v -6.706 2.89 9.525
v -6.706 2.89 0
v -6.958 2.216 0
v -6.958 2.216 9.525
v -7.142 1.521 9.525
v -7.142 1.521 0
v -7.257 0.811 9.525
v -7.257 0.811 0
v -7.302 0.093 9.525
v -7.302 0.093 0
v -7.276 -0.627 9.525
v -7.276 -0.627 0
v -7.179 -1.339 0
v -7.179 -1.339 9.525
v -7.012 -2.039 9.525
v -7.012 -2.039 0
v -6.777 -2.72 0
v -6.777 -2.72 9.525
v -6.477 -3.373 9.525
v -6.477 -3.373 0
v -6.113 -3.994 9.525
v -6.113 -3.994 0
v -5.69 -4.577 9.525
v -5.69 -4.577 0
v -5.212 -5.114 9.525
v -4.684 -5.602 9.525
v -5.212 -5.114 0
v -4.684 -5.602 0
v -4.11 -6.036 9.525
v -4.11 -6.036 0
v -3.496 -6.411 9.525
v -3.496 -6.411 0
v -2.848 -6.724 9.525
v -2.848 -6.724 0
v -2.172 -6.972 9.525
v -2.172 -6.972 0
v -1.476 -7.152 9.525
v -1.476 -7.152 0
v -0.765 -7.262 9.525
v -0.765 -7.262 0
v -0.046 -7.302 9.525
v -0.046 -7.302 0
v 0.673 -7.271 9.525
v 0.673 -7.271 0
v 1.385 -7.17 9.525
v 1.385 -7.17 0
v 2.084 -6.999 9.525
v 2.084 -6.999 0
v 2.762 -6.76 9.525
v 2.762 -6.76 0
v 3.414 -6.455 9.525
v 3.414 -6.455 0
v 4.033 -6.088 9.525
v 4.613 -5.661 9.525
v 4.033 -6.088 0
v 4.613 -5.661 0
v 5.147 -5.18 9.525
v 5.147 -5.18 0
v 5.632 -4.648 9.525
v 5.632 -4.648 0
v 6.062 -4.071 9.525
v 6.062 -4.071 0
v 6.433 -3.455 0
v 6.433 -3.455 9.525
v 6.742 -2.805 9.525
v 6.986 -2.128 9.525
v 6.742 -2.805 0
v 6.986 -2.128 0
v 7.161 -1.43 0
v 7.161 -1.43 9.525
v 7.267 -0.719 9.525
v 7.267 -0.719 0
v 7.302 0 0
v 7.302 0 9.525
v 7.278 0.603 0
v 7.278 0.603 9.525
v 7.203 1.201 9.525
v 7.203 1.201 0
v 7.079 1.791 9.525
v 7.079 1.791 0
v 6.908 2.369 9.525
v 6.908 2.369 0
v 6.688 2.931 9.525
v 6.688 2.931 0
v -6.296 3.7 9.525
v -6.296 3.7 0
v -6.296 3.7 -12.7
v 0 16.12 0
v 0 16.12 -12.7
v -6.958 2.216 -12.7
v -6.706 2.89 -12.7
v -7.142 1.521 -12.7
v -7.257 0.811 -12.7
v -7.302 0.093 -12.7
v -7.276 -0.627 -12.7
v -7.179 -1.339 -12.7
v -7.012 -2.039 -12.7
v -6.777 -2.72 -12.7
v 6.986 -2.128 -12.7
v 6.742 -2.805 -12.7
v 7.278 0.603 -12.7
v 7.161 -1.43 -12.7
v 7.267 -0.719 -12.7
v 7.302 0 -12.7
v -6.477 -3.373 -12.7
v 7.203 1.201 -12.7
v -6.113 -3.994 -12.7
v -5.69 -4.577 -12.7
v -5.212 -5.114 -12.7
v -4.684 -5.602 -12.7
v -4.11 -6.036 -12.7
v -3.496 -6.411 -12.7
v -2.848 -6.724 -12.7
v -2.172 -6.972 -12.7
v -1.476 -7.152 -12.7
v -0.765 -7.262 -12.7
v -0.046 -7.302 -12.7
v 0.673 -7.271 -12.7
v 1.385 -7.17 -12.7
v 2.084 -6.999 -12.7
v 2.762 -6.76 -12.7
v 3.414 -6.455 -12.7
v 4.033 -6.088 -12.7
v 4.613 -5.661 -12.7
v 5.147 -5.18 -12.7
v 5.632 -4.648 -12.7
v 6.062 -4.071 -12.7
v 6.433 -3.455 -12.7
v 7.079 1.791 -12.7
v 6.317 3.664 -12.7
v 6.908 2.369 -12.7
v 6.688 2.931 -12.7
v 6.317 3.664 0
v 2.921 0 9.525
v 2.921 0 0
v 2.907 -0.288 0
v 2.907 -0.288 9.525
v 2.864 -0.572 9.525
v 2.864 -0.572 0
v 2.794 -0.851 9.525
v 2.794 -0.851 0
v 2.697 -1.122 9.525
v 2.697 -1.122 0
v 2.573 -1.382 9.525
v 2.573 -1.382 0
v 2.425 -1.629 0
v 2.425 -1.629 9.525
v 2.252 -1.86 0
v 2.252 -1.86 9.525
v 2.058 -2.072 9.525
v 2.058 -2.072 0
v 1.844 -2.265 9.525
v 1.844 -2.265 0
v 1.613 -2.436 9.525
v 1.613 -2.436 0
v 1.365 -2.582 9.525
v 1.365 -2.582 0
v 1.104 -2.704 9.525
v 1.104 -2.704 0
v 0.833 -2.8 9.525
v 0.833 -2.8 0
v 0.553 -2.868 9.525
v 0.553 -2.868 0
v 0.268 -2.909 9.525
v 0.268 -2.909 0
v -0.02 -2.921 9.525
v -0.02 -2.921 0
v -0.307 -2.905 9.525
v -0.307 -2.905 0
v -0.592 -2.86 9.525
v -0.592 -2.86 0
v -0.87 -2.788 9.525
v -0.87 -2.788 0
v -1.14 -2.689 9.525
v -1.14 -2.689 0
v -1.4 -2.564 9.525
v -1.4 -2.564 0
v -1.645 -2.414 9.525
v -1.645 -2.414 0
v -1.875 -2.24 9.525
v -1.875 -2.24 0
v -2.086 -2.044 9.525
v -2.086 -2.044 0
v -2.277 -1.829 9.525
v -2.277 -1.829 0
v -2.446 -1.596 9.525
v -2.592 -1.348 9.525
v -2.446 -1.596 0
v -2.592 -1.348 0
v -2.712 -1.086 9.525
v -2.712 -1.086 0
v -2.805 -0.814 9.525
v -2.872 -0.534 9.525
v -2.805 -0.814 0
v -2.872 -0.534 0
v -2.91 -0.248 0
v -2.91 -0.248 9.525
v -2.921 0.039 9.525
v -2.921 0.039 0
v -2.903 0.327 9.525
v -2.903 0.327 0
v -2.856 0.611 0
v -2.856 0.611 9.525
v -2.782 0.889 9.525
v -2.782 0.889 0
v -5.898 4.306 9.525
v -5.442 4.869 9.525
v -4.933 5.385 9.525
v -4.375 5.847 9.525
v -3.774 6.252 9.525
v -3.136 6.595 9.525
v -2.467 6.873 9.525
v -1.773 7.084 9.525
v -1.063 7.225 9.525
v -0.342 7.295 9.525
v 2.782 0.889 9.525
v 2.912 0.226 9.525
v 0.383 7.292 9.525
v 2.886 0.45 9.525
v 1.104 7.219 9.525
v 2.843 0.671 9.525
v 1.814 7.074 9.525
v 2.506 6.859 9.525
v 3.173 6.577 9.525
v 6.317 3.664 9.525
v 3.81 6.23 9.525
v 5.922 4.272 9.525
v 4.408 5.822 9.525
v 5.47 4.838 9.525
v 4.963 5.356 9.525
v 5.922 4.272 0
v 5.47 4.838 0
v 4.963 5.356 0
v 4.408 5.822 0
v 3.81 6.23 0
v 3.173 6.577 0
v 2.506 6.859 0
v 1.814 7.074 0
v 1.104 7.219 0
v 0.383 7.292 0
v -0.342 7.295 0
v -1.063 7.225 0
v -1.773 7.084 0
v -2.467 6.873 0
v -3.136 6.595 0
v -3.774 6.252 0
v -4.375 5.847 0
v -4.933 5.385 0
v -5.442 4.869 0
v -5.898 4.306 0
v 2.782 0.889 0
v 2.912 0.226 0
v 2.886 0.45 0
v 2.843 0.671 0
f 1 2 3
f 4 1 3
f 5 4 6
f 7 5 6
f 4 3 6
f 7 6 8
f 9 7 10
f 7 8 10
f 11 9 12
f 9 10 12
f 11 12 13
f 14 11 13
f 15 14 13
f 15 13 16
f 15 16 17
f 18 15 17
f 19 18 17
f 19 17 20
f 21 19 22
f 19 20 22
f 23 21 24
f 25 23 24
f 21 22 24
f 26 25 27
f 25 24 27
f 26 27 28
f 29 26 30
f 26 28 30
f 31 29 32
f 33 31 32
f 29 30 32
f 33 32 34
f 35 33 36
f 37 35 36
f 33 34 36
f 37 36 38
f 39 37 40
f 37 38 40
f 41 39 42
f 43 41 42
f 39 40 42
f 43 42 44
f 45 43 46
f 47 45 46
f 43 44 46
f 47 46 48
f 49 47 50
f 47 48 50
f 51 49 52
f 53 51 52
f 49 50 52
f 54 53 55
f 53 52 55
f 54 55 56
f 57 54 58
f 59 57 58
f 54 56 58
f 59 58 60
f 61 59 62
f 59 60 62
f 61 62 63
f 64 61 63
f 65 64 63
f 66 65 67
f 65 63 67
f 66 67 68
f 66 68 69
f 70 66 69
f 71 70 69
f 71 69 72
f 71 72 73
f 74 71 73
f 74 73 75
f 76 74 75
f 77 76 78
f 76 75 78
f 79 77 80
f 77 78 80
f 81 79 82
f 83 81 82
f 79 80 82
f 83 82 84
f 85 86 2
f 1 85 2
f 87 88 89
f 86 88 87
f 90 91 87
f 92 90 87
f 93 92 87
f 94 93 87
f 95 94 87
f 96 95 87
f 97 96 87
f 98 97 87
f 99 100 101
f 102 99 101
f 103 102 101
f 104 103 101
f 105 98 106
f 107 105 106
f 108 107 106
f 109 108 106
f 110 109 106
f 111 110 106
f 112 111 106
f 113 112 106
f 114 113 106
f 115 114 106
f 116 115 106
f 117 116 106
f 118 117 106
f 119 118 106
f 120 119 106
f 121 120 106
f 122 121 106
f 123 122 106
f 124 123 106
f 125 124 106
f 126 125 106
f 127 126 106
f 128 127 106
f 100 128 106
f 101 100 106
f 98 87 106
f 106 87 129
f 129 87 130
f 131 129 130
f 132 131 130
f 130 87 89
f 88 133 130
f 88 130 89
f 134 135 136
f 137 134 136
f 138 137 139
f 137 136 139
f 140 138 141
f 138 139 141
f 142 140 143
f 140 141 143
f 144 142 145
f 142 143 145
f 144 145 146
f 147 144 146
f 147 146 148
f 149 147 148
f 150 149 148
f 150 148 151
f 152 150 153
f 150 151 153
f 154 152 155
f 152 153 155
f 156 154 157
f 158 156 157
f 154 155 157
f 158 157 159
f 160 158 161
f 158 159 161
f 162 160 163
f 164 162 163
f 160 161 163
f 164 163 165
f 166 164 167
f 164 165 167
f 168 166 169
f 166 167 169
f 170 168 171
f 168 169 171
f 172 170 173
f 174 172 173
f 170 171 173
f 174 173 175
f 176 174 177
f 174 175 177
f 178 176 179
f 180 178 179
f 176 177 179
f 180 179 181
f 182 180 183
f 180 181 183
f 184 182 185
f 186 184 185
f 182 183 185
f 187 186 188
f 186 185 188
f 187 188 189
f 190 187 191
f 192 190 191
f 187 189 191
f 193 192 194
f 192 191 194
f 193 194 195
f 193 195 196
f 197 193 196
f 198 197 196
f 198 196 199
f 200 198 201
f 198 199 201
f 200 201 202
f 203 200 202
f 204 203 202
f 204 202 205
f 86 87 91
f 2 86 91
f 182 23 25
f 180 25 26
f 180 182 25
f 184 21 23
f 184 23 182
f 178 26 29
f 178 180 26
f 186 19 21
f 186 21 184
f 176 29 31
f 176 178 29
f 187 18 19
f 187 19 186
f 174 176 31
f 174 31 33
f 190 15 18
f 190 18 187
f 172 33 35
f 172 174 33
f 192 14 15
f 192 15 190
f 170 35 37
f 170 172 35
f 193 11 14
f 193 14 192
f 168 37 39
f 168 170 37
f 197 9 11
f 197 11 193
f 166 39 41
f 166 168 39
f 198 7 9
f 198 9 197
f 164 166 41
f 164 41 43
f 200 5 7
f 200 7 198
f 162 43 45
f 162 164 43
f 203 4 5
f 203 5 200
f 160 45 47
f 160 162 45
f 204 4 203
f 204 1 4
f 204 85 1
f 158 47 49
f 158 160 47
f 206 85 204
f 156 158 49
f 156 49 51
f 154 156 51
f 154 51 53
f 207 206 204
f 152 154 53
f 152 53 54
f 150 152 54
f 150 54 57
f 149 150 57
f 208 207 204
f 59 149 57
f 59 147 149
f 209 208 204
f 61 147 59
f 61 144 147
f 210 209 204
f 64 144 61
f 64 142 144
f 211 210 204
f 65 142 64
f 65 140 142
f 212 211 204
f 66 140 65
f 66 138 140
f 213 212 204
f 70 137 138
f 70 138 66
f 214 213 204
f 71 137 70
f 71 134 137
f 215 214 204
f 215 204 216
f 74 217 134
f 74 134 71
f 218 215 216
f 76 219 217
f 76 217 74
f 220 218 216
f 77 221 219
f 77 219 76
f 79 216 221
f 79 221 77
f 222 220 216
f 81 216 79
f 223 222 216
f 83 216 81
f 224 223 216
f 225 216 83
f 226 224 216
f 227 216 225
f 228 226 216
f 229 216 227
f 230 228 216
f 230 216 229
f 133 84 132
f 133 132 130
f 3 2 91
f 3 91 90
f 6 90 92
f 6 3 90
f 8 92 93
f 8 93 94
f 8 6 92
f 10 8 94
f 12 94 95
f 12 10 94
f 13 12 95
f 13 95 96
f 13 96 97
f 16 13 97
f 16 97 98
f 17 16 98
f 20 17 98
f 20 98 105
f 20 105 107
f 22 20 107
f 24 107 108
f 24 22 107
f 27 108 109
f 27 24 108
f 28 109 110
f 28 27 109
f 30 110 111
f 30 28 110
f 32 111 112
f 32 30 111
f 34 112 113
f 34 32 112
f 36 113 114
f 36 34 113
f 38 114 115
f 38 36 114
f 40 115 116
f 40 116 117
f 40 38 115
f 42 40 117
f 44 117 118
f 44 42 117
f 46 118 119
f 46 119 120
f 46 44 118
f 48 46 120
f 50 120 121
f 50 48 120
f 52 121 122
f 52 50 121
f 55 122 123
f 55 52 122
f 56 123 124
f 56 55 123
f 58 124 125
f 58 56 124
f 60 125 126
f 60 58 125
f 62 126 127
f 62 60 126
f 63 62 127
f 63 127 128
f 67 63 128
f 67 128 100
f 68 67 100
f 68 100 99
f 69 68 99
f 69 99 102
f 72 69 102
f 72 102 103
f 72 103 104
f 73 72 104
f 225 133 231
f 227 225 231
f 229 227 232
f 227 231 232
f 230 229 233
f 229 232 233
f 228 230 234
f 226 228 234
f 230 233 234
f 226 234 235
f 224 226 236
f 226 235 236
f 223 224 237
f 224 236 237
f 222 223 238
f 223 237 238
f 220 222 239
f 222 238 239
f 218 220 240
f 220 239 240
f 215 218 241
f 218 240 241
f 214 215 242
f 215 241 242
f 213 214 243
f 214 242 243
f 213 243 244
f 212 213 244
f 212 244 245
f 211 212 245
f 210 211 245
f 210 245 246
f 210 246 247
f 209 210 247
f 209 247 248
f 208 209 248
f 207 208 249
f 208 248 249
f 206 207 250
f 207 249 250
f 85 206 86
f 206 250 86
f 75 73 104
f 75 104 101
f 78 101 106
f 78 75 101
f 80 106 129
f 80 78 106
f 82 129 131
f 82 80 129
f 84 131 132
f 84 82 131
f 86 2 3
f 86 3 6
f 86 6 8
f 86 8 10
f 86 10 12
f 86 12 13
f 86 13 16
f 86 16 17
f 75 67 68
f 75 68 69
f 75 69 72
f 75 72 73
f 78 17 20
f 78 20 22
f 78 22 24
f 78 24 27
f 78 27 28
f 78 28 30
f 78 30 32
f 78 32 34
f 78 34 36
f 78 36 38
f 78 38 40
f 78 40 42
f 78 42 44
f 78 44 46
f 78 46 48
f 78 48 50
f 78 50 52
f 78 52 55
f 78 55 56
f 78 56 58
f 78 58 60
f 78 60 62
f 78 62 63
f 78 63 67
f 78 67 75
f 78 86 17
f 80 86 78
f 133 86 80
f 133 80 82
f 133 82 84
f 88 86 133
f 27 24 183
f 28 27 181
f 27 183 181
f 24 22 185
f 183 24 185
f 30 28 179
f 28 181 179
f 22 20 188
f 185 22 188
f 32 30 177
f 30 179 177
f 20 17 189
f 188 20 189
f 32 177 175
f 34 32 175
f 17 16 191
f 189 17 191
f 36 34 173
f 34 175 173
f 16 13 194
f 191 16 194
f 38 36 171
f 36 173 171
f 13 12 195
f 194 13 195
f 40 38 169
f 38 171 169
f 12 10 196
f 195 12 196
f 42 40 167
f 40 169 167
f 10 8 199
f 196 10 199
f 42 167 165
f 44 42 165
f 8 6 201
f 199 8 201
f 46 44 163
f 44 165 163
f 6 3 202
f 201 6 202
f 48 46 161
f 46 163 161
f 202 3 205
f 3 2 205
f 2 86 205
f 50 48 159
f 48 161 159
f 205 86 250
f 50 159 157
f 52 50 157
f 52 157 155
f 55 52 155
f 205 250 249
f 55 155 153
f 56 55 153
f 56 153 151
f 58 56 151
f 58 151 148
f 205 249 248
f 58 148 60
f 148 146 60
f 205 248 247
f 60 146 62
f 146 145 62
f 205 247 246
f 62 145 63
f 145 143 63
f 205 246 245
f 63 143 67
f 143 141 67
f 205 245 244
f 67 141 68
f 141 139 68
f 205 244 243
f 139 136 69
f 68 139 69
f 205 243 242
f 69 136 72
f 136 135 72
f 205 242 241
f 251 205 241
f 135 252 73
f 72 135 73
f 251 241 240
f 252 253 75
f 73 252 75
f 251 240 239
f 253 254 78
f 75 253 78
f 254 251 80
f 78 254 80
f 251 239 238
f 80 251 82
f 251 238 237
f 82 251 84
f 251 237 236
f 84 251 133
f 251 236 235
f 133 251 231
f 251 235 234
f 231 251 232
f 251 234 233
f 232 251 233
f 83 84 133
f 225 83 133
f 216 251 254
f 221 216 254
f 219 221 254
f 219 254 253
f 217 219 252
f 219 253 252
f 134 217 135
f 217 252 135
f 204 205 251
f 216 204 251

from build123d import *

# Parameters (mm, degrees)
F1_DEPTH = 9.525
F2_DEPTH = 12.7


with BuildPart() as f1:
    # F0 (on Top) → F1 (new body)
    with BuildSketch(Plane.XY):
        with BuildLine():
            ThreePointArc((-6.7061053414, 2.890442423), (-1.4756645952, -7.1518473315), (7.3025, 0))
            ThreePointArc((7.3025, 0), (7.1473488528, 1.4973011139), (6.6884881888, 2.9309779936))
            Line((6.6884881888, 2.9309779936), (6.3166219962, 3.6642588347))
            ThreePointArc((6.3166219962, 3.6642588347), (0.0208084361, 7.3024703532), (-6.2956369305, 3.7001975474))
            Line((-6.2956369305, 3.7001975474), (-6.7061053414, 2.890442423))
        make_face()
        with BuildLine():
            ThreePointArc((2.7824305921, 0.889), (2.8861497501, 0.4498673362), (2.921, 0))
            ThreePointArc((2.921, 0), (-0.4498673362, -2.8861497501), (-2.7824305921, 0.889))
            ThreePointArc((-2.7824305921, 0.889), (0, 2.921), (2.7824305921, 0.889))
        make_face(mode=Mode.SUBTRACT)
        with BuildLine():
            Line((-2.7824305921, 0.889), (2.7824305921, 0.889))
            ThreePointArc((2.7824305921, 0.889), (0, 2.921), (-2.7824305921, 0.889))
        make_face()
    extrude(amount=F1_DEPTH)


with BuildPart() as f2:
    # F0 (on Top) → F2 (new body)
    with BuildSketch(Plane.XY):
        with BuildLine():
            ThreePointArc((-6.7061053414, 2.890442423), (-1.4756645952, -7.1518473315), (7.3025, 0))
            ThreePointArc((7.3025, 0), (7.1473488528, 1.4973011139), (6.6884881888, 2.9309779936))
            Line((6.6884881888, 2.9309779936), (6.3166219962, 3.6642588347))
            ThreePointArc((6.3166219962, 3.6642588347), (0.0208084361, 7.3024703532), (-6.2956369305, 3.7001975474))
            Line((-6.2956369305, 3.7001975474), (-6.7061053414, 2.890442423))
        make_face()
        with BuildLine():
            ThreePointArc((2.7824305921, 0.889), (2.8861497501, 0.4498673362), (2.921, 0))
            ThreePointArc((2.921, 0), (-0.4498673362, -2.8861497501), (-2.7824305921, 0.889))
            ThreePointArc((-2.7824305921, 0.889), (0, 2.921), (2.7824305921, 0.889))
        make_face(mode=Mode.SUBTRACT)
        with BuildLine():
            ThreePointArc((-6.2956369305, 3.7001975474), (0.0208084361, 7.3024703532), (6.3166219962, 3.6642588347))
            Line((6.3166219962, 3.6642588347), (0, 16.1199700087))
            Line((0, 16.1199700087), (-6.2956369305, 3.7001975474))
        make_face()
        with BuildLine():
            ThreePointArc((-2.7824305921, 0.889), (-0.4498673362, -2.8861497501), (2.921, 0))
            ThreePointArc((2.921, 0), (2.8861497501, 0.4498673362), (2.7824305921, 0.889))
            Line((2.7824305921, 0.889), (-2.7824305921, 0.889))
        make_face()
        with BuildLine():
            Line((-2.7824305921, 0.889), (2.7824305921, 0.889))
            ThreePointArc((2.7824305921, 0.889), (0, 2.921), (-2.7824305921, 0.889))
        make_face()
    extrude(amount=-F2_DEPTH)


solid = Compound([f1.part, f2.part])
